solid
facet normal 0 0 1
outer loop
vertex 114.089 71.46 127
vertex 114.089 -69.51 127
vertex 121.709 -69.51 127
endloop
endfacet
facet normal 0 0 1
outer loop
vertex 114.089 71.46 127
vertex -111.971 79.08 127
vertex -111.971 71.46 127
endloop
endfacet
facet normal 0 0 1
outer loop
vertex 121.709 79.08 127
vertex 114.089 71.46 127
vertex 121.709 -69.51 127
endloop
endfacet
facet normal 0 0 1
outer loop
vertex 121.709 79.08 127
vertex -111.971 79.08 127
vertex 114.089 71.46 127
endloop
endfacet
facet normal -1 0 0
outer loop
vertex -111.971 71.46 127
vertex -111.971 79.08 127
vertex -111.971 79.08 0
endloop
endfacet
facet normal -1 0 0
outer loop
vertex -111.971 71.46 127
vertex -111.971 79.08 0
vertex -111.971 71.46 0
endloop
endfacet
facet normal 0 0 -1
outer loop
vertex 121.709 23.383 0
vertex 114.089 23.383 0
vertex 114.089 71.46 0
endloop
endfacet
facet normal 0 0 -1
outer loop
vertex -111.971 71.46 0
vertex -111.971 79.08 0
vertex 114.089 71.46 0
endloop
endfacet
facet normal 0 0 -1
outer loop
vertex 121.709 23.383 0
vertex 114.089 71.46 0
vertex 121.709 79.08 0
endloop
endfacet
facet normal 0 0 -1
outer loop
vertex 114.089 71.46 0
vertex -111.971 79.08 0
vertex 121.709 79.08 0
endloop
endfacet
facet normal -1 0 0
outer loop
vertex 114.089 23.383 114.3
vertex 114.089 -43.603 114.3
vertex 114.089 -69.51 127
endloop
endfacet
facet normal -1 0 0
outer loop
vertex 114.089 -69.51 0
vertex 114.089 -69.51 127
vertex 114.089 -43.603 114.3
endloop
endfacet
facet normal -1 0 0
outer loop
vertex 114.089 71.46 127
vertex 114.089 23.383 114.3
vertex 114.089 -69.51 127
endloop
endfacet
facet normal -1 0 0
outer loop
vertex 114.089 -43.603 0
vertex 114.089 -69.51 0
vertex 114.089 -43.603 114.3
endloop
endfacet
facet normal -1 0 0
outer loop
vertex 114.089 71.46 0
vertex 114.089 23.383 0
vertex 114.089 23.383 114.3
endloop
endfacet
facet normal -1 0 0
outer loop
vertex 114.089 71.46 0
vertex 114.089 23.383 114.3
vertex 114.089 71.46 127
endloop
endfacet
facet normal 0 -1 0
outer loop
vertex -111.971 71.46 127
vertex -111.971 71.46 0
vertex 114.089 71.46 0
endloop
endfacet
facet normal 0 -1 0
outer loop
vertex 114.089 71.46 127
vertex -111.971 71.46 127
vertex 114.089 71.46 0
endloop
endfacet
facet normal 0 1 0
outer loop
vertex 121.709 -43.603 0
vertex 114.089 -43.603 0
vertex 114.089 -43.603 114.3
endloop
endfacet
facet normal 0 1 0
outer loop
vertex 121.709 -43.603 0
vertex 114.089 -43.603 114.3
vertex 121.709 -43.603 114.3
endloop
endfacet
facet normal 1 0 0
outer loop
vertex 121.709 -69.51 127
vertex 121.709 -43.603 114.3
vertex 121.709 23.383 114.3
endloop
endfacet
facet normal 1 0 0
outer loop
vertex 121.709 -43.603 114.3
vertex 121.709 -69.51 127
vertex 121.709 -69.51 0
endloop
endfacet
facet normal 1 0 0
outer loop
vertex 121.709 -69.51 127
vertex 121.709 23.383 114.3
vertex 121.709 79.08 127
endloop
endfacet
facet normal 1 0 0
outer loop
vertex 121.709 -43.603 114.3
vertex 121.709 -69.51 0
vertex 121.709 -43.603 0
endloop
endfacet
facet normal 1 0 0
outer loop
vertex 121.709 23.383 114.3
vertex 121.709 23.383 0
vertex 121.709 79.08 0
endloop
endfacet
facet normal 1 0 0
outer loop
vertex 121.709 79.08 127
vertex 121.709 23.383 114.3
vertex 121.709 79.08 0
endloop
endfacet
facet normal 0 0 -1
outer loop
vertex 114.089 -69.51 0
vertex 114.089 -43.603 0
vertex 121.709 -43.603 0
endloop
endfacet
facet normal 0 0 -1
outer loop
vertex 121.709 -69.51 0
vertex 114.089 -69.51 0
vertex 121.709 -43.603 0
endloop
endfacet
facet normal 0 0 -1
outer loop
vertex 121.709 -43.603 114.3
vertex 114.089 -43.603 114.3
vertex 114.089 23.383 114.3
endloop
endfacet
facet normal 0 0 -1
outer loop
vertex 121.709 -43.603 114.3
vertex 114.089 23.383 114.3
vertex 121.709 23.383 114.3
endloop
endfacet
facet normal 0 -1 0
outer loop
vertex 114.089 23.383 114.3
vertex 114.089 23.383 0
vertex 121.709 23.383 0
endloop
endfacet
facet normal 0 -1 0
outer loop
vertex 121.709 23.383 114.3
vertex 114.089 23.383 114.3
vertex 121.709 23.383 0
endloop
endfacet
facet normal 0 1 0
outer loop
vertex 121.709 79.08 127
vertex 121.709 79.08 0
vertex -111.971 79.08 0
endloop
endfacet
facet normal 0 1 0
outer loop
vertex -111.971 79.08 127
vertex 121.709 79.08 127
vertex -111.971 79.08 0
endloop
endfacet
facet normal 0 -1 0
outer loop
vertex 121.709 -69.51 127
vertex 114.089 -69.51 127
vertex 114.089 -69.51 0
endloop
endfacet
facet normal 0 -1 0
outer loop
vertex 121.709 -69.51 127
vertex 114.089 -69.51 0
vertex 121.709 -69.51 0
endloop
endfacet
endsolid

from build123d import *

# Parameters (mm, degrees)
F0_W     = 7.62
F0_H     = 48.07742
F1_DEPTH = 127
F0_H_2   = 66.986127
F2_DEPTH = 127
F3_DEPTH = 114.3
F0_H_3   = 25.906453
F4_DEPTH = 127


with BuildPart() as f1:
    # F0 (on Top) → F1 (new body)
    with BuildSketch(Plane.XY):
        Polygon((121.709297, 79.080492), (-111.970703, 79.080492), (-111.970703, 71.460492), (114.089297, 71.460492), (121.709297, 71.460492), align=None)
        with Locations((117.899297, 47.421782)):
            Rectangle(F0_W, F0_H)
    extrude(amount=F1_DEPTH)

    # F0 (on Top) → F2 (join)
    with BuildSketch(Plane.XY):
        with Locations((117.899297, -10.109991)):
            Rectangle(F0_W, F0_H_2)
    extrude(amount=F2_DEPTH)

    # F0 (on Top) → F3 (cut)
    with BuildSketch(Plane.XY):
        with Locations((117.899297, -10.109991)):
            Rectangle(F0_W, F0_H_2)
    extrude(amount=F3_DEPTH, mode=Mode.SUBTRACT)

    # F0 (on Top) → F4 (join)
    with BuildSketch(Plane.XY):
        with Locations((117.899297, -56.556281)):
            Rectangle(F0_W, F0_H_3)
    extrude(amount=F4_DEPTH)


solid = f1.part
